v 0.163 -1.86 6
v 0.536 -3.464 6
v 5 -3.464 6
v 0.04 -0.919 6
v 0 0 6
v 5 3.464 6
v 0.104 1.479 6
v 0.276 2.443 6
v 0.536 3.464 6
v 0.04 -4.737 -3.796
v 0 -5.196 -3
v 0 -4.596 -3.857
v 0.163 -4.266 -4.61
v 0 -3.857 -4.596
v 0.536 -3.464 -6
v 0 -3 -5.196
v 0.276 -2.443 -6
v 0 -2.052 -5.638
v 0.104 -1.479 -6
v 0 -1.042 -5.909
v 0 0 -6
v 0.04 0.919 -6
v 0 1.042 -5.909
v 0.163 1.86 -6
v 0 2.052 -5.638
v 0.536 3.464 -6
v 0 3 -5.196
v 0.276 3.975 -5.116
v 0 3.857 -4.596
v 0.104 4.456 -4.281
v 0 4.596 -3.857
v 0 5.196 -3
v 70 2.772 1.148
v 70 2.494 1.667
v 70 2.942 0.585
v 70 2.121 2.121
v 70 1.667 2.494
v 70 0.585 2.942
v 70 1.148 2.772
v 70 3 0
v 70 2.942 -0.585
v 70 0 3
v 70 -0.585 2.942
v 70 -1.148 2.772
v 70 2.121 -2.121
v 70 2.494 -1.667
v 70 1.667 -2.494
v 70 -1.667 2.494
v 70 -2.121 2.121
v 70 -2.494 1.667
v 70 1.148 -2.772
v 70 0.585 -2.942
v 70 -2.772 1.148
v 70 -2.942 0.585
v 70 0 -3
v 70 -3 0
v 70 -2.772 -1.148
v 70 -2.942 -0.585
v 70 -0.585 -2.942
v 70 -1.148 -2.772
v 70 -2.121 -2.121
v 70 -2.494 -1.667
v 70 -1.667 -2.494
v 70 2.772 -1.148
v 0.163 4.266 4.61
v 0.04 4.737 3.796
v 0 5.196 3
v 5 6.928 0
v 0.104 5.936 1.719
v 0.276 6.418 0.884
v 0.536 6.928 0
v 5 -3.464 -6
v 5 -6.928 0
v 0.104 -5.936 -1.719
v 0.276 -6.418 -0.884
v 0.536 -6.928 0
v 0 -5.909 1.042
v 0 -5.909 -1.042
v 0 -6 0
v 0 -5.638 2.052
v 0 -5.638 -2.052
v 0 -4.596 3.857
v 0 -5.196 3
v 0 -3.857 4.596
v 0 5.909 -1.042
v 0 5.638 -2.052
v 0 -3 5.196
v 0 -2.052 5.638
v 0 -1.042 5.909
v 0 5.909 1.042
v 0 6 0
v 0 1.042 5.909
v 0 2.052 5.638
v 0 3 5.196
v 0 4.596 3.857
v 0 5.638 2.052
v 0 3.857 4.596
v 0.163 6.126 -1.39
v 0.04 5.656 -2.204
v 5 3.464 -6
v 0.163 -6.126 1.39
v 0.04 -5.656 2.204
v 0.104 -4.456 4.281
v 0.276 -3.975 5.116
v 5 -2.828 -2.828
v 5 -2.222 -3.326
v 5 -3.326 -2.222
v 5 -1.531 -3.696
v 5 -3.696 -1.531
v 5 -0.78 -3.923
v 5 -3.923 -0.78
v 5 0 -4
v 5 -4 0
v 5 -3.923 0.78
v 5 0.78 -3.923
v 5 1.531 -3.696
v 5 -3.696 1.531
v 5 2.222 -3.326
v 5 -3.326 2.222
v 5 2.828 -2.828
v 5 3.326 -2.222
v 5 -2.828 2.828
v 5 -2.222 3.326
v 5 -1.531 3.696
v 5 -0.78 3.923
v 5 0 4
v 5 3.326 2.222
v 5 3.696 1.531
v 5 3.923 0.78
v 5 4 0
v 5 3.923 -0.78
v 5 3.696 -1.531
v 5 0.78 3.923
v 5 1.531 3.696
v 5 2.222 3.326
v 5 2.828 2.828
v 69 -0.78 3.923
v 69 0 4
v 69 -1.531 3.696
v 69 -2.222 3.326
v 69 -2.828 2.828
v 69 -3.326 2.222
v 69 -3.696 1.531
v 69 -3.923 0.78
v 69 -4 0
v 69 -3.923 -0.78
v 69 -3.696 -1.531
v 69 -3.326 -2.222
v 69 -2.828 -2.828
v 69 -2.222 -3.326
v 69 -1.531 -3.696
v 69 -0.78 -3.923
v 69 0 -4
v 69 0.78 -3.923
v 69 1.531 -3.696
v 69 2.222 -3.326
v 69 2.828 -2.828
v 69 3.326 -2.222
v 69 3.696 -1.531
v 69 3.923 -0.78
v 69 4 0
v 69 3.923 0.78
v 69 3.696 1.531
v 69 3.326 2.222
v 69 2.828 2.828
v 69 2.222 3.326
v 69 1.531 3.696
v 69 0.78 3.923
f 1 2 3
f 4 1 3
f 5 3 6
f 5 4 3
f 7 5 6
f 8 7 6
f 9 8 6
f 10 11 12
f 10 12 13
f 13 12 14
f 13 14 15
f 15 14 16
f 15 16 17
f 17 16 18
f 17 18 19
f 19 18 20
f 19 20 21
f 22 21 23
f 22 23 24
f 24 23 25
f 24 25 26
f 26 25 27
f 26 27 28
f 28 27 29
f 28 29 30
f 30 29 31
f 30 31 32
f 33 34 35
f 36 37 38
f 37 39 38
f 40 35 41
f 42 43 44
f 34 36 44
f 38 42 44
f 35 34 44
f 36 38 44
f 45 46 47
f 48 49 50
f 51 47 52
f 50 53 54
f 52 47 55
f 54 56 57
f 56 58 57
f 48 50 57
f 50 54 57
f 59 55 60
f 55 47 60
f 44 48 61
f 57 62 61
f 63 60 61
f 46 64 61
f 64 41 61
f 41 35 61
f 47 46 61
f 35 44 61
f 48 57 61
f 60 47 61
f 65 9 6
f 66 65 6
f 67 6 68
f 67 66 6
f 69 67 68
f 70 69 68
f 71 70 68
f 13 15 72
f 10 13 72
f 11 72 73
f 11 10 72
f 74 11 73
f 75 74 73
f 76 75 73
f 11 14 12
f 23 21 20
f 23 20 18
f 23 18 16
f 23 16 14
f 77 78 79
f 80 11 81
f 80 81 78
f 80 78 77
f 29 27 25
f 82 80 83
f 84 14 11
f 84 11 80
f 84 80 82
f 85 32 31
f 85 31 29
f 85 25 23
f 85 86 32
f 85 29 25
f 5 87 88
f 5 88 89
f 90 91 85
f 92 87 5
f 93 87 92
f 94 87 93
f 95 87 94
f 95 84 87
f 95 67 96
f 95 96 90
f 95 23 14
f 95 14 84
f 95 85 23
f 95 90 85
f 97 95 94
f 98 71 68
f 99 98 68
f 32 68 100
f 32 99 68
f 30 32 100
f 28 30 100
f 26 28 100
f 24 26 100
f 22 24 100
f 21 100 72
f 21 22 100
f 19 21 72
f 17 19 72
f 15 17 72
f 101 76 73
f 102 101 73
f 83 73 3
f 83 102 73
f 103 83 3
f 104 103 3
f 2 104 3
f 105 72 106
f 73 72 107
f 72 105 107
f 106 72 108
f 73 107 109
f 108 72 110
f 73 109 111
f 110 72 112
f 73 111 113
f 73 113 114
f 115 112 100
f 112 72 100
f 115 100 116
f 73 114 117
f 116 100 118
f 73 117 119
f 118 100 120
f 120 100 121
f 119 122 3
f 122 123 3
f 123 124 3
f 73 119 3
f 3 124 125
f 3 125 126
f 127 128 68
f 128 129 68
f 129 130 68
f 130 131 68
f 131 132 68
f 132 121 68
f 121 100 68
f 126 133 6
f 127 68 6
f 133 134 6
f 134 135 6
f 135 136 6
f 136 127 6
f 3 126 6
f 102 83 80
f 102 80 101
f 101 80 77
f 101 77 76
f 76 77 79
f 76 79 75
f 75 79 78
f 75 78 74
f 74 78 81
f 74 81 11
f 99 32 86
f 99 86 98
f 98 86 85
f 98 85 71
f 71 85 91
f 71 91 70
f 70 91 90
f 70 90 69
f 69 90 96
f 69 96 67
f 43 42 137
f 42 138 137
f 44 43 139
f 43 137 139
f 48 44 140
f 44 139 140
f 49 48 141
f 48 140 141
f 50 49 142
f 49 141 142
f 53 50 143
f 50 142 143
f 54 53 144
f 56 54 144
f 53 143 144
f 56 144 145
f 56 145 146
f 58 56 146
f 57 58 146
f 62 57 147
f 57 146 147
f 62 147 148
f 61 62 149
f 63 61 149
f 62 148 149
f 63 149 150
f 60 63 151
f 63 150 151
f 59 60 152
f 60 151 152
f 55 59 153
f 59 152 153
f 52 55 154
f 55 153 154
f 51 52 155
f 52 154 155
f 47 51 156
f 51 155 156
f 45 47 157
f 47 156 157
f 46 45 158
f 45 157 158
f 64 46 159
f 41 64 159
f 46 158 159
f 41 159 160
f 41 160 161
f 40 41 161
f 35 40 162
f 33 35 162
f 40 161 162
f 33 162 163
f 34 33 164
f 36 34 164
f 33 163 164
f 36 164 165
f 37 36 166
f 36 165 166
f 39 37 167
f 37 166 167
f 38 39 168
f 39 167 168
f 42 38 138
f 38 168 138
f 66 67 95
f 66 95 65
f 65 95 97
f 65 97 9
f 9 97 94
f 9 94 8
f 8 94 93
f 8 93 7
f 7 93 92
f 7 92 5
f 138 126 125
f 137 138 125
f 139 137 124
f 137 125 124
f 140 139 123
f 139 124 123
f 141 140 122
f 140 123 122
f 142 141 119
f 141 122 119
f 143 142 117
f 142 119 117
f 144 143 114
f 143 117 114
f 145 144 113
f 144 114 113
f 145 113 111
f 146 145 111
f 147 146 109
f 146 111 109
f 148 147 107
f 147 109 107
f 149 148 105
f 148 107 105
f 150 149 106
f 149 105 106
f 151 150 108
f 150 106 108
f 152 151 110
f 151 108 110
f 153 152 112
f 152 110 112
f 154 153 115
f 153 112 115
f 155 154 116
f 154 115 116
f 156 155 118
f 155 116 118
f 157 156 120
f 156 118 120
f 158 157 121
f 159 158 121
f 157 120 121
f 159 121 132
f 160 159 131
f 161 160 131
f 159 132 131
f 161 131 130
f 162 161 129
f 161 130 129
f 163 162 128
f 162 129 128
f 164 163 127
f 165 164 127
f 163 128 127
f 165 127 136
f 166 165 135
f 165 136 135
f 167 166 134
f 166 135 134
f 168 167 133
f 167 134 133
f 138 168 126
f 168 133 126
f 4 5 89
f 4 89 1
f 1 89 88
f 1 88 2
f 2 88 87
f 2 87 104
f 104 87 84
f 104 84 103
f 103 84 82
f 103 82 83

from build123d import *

# Parameters (mm, degrees)
BASEHEAD_DEPTH = 5
BEARINGSKE_W   = 0.8
BEARINGSKE_H   = 8.07179677


with BuildPart() as part:
    # HeadSke → BaseHead (new body)
    with BuildSketch(Plane(origin=(0, 0, 0), x_dir=(0, 0, -1), z_dir=(1, 0, 0))):
        Polygon((6, 3.464101615), (6, -3.464101615), (0, -6.92820323), (-6, -3.464101615), (-6, 3.464101615), (0, 6.92820323), align=None)
    extrude(amount=BASEHEAD_DEPTH)

    # BodySke → BaseBody (revolve)
    with BuildSketch(Plane.XY, mode=Mode.PRIVATE) as basebody_sk:
        Polygon((0, 0), (70, 0), (70, 3), (69, 4), (0, 4), align=None)
    revolve(basebody_sk.sketch.rotate(Axis((0, 0, 0), (1, 0, 0)), 90), axis=Axis((0, 0, 0), (1, 0, 0)))

    # Sketch3 → HeadChamfer (revolve, cut)
    with BuildSketch(Plane(origin=(0, 0, 0), x_dir=(1, 0, 0), z_dir=(0, 1, 0))):
        Polygon((1.5, 8.598076211), (-1.5, 3.401923789), (-13.554766255, 10.361746331), (-10.554766255, 15.557898754), align=None)
    revolve(axis=Axis((0, 0, 0), (1, 0, 0)), mode=Mode.SUBTRACT)

    # BearingSke → BearingFace (revolve, cut)
    with BuildSketch(Plane.XY):
        with Locations((4.6, 10.964101615)):
            Rectangle(BEARINGSKE_W, BEARINGSKE_H)
    revolve(axis=Axis((0, 0, 0), (1, 0, 0)), mode=Mode.SUBTRACT)


solid = part.part
